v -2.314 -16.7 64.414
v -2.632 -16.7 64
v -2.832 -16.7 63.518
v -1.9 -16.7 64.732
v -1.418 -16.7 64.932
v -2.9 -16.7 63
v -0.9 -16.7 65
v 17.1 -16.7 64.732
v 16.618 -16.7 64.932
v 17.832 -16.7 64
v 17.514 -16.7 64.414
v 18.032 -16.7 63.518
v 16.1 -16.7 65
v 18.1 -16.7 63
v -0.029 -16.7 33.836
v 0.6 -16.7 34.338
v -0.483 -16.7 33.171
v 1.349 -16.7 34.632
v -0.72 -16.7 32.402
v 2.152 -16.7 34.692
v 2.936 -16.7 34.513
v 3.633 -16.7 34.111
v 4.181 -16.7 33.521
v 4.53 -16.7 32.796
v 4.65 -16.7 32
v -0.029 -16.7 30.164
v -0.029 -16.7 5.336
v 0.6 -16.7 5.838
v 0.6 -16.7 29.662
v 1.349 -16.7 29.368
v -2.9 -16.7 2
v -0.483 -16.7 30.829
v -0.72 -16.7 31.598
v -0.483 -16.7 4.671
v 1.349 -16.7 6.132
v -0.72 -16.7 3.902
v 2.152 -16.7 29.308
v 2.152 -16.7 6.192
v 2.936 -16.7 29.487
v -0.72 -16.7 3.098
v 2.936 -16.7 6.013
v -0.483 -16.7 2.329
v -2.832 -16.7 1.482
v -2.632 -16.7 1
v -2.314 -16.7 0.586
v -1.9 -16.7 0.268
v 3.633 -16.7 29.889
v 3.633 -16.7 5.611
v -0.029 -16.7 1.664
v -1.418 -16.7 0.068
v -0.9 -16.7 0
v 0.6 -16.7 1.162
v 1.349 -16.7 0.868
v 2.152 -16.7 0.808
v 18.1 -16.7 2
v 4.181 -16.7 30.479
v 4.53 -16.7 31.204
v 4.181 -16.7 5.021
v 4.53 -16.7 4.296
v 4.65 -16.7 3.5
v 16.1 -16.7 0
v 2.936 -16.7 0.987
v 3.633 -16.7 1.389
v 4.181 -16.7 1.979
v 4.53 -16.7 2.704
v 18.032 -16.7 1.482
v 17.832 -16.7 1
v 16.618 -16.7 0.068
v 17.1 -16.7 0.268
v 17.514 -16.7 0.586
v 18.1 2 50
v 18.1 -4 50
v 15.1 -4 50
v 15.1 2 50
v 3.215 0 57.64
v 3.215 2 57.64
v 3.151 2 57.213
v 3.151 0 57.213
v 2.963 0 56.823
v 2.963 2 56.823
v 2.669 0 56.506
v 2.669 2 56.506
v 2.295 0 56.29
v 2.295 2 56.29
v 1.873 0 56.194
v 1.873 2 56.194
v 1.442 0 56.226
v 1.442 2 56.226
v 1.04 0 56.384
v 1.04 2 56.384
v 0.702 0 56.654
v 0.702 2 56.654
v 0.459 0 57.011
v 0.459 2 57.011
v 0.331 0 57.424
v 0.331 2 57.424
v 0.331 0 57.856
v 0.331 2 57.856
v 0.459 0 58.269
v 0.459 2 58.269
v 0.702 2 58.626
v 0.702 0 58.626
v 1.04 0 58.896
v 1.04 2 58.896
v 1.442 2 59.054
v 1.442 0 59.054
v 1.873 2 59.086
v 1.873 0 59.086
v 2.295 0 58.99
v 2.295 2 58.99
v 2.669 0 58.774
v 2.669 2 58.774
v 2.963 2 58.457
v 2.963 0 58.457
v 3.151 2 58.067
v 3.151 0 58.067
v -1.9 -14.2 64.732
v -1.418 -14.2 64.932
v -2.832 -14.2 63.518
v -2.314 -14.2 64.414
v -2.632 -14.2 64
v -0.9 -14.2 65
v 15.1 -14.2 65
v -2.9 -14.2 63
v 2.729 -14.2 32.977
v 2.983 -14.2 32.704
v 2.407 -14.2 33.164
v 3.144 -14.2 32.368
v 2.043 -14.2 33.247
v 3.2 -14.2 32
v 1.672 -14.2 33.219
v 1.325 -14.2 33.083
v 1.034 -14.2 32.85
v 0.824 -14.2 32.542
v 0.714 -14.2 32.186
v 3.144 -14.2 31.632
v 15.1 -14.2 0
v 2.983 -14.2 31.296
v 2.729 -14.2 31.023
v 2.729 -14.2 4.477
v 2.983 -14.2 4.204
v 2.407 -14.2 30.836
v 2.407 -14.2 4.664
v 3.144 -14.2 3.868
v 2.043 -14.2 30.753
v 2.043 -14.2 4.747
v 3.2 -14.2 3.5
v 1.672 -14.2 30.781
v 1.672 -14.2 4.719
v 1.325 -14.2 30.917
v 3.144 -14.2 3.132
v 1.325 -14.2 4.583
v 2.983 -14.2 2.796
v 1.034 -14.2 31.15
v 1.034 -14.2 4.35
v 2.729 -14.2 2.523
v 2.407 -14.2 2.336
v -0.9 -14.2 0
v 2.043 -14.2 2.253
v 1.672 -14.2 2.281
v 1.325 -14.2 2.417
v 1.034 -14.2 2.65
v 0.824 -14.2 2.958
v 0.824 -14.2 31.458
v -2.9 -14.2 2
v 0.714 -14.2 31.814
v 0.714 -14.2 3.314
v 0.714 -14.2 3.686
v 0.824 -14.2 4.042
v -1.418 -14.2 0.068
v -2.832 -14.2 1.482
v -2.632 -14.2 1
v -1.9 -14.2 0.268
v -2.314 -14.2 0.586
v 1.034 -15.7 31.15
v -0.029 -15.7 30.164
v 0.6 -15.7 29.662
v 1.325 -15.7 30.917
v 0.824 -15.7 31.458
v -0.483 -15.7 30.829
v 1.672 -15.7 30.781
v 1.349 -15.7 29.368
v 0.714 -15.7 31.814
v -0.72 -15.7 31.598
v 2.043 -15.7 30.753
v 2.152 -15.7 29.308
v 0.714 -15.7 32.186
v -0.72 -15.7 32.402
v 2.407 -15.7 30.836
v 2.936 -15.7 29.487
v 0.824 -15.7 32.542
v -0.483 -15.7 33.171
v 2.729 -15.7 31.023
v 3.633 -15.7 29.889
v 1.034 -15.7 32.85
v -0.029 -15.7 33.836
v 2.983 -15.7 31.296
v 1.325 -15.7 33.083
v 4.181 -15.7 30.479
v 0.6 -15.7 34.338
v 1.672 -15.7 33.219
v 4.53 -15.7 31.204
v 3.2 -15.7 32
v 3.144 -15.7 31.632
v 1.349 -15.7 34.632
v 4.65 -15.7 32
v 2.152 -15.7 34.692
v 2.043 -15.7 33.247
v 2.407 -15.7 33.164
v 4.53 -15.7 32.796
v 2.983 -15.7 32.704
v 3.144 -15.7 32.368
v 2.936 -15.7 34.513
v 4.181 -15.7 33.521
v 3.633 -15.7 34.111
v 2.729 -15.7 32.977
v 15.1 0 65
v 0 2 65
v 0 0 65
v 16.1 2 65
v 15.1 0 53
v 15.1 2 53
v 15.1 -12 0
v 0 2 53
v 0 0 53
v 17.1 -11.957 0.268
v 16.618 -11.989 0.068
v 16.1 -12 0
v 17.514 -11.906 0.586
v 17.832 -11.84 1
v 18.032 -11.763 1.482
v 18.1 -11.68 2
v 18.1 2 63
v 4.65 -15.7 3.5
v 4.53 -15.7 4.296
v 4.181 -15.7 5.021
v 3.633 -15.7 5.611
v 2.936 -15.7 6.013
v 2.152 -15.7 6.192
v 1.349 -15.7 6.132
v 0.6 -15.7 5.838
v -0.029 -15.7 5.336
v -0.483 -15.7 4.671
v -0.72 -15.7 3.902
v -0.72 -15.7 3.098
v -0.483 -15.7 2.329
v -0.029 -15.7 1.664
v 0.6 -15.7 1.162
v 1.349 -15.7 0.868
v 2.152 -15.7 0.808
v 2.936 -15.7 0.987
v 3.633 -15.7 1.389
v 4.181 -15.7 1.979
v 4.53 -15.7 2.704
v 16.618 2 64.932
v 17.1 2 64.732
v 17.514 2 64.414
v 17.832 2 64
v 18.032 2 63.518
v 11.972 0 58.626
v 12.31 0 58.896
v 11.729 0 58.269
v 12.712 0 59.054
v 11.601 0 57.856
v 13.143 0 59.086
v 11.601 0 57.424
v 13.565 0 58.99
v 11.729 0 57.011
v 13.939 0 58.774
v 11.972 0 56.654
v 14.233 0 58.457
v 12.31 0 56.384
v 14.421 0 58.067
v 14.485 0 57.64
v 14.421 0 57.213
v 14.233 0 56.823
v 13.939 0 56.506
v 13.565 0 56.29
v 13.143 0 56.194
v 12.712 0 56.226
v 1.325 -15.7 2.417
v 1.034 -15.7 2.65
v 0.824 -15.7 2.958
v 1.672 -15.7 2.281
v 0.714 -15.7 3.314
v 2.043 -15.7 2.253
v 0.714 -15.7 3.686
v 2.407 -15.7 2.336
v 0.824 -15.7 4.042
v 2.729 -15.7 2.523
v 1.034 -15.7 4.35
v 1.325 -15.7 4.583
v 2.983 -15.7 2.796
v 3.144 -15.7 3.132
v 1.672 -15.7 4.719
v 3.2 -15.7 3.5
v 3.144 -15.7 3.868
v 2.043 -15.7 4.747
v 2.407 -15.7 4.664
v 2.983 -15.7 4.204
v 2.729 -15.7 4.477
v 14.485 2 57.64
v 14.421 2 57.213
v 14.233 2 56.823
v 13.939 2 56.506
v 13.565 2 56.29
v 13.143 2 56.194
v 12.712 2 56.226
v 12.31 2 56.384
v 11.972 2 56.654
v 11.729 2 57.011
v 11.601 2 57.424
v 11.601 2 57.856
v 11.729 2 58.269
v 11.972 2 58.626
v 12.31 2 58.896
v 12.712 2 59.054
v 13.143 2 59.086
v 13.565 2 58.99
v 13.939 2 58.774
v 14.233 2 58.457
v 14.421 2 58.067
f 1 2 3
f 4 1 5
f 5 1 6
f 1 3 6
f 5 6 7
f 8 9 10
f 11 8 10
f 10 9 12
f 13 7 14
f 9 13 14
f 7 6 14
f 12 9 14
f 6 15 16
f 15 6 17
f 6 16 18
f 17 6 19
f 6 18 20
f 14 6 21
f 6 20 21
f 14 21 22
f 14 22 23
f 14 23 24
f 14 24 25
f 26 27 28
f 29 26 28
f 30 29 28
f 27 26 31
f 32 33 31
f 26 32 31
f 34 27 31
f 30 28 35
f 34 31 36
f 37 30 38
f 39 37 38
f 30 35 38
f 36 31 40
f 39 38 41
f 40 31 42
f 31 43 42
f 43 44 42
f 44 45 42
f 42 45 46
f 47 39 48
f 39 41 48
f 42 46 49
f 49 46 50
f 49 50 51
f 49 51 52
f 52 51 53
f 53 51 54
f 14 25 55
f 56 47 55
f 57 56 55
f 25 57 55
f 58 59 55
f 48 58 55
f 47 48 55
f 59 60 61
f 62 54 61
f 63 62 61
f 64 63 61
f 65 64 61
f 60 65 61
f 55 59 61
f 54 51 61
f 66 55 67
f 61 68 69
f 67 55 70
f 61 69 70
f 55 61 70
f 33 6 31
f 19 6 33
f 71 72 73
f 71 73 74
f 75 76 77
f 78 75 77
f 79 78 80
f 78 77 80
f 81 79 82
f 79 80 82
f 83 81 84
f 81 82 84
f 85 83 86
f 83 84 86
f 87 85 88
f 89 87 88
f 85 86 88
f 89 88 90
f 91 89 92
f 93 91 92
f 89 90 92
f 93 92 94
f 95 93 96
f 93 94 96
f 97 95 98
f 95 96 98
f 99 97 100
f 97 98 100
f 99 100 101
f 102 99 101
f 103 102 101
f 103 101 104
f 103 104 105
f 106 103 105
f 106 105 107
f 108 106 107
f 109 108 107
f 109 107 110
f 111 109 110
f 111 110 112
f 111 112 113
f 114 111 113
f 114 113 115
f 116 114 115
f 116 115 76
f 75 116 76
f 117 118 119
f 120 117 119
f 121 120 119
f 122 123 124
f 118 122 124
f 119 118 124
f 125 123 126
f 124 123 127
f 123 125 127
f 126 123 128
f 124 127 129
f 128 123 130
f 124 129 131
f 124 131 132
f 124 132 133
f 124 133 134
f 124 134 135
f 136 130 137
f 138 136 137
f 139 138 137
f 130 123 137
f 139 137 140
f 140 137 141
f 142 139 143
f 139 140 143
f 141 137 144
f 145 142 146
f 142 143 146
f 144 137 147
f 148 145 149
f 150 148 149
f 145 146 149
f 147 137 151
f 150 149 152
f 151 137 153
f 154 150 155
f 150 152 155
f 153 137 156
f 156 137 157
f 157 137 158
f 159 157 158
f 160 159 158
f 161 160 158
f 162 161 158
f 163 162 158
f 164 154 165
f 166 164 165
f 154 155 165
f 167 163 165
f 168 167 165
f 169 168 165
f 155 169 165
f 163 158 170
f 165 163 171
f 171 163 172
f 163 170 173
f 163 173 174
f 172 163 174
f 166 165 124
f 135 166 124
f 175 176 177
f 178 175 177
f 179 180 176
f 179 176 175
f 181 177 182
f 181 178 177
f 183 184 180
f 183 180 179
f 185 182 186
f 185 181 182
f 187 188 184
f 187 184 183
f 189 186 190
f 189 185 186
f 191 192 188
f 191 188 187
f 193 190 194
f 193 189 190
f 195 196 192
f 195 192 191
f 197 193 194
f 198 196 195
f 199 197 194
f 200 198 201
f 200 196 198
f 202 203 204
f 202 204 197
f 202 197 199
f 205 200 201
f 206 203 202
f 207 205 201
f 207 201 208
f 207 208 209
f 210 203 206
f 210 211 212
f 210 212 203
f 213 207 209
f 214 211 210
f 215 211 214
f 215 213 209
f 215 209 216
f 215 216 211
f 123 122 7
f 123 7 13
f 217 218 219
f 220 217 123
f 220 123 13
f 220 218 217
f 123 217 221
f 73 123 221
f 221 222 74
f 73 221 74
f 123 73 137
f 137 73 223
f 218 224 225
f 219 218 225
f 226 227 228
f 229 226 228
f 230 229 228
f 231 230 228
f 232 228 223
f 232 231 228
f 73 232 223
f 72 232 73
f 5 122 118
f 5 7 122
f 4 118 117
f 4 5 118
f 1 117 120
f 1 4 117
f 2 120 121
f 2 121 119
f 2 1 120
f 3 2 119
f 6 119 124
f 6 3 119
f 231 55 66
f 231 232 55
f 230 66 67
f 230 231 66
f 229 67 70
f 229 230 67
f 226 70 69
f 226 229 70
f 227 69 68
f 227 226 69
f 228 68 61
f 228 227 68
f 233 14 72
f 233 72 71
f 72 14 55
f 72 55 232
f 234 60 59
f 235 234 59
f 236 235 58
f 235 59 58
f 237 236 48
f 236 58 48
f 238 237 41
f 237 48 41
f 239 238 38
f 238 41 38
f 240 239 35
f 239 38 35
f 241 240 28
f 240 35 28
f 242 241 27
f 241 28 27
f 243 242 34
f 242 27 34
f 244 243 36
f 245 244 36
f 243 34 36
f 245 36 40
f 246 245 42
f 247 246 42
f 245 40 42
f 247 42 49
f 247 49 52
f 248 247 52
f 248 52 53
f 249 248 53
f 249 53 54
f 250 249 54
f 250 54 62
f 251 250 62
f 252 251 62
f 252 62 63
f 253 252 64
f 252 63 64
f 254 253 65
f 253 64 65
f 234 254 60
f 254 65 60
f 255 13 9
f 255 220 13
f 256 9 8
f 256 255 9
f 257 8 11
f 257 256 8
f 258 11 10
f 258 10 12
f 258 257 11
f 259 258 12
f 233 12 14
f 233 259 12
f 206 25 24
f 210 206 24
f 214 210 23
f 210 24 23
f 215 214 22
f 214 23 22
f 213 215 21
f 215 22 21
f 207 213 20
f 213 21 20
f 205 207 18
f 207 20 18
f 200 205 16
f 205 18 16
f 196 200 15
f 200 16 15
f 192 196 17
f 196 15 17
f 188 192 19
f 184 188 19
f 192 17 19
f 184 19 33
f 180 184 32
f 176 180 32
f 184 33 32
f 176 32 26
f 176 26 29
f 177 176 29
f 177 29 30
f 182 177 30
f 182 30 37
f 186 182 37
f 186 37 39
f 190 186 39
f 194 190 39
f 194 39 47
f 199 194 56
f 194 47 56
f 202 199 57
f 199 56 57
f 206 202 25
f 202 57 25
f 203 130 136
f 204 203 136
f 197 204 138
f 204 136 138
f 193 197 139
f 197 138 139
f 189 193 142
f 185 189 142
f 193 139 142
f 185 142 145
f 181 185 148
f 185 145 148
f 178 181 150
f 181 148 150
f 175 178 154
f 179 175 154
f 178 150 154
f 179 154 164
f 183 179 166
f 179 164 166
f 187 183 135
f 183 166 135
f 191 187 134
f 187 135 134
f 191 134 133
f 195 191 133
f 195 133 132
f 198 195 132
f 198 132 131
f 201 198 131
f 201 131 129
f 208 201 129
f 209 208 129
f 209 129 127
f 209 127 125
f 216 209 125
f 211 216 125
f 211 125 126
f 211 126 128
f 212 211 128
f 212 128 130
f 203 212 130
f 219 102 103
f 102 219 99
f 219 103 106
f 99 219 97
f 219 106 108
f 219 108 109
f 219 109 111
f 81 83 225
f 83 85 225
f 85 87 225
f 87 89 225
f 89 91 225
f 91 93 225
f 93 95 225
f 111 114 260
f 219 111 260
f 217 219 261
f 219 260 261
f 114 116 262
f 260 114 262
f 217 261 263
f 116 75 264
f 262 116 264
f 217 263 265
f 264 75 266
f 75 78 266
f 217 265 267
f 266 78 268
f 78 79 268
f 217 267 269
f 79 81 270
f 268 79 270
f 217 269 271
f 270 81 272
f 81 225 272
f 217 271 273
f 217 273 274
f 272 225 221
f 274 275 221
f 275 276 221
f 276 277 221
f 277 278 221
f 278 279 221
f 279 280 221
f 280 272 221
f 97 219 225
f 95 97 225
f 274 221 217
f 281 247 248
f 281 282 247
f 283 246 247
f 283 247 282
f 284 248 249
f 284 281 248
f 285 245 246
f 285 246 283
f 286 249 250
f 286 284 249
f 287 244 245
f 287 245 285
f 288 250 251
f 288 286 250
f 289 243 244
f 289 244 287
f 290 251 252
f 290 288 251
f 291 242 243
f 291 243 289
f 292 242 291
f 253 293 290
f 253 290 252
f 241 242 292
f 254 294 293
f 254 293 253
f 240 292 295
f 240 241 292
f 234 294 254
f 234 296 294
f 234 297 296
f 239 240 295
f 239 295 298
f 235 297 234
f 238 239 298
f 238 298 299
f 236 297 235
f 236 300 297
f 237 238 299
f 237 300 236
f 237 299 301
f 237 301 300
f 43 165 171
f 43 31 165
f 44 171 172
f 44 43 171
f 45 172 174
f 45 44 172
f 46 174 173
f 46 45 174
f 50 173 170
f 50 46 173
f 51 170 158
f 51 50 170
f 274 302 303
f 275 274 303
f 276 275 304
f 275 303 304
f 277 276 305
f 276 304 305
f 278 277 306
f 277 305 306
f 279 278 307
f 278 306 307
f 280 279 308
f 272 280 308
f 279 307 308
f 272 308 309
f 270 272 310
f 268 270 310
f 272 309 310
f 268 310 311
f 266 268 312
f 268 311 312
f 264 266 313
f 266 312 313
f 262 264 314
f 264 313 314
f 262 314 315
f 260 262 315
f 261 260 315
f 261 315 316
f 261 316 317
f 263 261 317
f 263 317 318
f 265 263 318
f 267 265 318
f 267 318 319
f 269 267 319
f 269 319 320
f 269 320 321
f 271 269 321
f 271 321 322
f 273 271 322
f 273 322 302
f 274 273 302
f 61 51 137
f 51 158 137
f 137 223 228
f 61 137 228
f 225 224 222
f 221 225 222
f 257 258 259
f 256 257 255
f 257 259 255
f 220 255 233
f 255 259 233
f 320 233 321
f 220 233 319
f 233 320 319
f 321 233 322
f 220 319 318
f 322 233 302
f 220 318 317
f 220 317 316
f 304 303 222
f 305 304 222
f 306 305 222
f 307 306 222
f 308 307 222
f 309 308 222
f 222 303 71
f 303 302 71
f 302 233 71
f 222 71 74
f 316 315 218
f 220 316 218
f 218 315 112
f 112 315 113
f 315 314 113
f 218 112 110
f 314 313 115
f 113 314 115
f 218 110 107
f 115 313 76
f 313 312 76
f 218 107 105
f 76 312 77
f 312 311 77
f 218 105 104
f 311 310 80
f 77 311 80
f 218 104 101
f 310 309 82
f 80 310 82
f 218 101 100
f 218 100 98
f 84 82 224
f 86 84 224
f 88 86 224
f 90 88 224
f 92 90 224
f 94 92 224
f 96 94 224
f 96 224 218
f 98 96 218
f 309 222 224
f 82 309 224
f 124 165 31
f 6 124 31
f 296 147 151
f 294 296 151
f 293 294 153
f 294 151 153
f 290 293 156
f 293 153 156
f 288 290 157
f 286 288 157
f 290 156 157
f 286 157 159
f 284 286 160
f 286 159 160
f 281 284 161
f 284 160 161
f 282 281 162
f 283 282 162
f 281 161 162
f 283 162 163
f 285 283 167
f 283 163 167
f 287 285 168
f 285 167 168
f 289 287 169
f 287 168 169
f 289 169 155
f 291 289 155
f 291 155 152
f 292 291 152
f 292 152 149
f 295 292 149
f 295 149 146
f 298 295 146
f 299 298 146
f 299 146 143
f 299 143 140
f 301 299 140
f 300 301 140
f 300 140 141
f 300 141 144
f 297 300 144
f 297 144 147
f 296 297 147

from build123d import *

# Parameters (mm, degrees)
EXTRUDE_1_DEPTH     = 65
CUT_EXTRUDE_1_REACH = 20.7
SKETCH_2_R          = 1.45
SKETCH_2_W          = 15.1
SKETCH_2_H          = 53
CUT_EXTRUDE_2_REACH = 4.5
SKETCH_3_R          = 1.25
CUT_EXTRUDE_3_REACH = 23
FILLET_1_R          = 2
SKETCH_5_R          = 2.7
CUT_EXTRUDE_4_DEPTH = 1


with BuildPart() as part:
    # 草图1 → 凸台-拉伸1 (new body)
    with BuildSketch(Plane.XY):
        Polygon((0, 2), (0, 0), (15.1, 0), (15.1, -14.2), (-2.9, -14.2), (-2.9, -16.7), (18.1, -16.7), (18.1, 2), align=None)
    extrude(amount=EXTRUDE_1_DEPTH)

    # 草图2 → 切除-拉伸1 (cut, up to next)
    with BuildSketch(Plane(origin=(0, 2, 0), x_dir=(1, 0, 0), z_dir=(0, 1, 0)), mode=Mode.PRIVATE) as cut_extrude_1_sk1:
        with Locations((1.765, -57.64)):
            Circle(SKETCH_2_R)
    cut_extrude_1_tool1 = extrude(cut_extrude_1_sk1.sketch, amount=-CUT_EXTRUDE_1_REACH, mode=Mode.PRIVATE) & part.part
    add(cut_extrude_1_tool1.solids().sort_by_distance((1.765, 2, 57.64))[0], mode=Mode.SUBTRACT)
    # 草图2 → 切除-拉伸1 (cut, up to next)
    with BuildSketch(Plane(origin=(0, 2, 0), x_dir=(1, 0, 0), z_dir=(0, 1, 0)), mode=Mode.PRIVATE) as cut_extrude_1_sk2:
        with Locations((13.035, -57.64)):
            Circle(SKETCH_2_R)
    cut_extrude_1_tool2 = extrude(cut_extrude_1_sk2.sketch, amount=-CUT_EXTRUDE_1_REACH, mode=Mode.PRIVATE) & part.part
    add(cut_extrude_1_tool2.solids().sort_by_distance((13.035, 2, 57.64))[0], mode=Mode.SUBTRACT)
    # 草图2 → 切除-拉伸1 (cut, up to next)
    with BuildSketch(Plane(origin=(0, 2, 0), x_dir=(1, 0, 0), z_dir=(0, 1, 0)), mode=Mode.PRIVATE) as cut_extrude_1_sk3:
        with Locations((7.55, -26.5)):
            Rectangle(SKETCH_2_W, SKETCH_2_H)
    cut_extrude_1_tool3 = extrude(cut_extrude_1_sk3.sketch, amount=-CUT_EXTRUDE_1_REACH, mode=Mode.PRIVATE) & part.part
    add(cut_extrude_1_tool3.solids().sort_by_distance((7.55, 2, 26.5))[0], mode=Mode.SUBTRACT)

    # 草图3 → 切除-拉伸2 (cut, up to next)
    with BuildSketch(Plane(origin=(0, -14.2, 0), x_dir=(1, 0, 0), z_dir=(0, 1, 0)), mode=Mode.PRIVATE) as cut_extrude_2_sk1:
        with Locations((1.95, -3.5)):
            Circle(SKETCH_3_R)
    cut_extrude_2_tool1 = extrude(cut_extrude_2_sk1.sketch, amount=-CUT_EXTRUDE_2_REACH, mode=Mode.PRIVATE) & part.part
    add(cut_extrude_2_tool1.solids().sort_by_distance((1.95, -14.2, 3.5))[0], mode=Mode.SUBTRACT)
    # 草图3 → 切除-拉伸2 (cut, up to next)
    with BuildSketch(Plane(origin=(0, -14.2, 0), x_dir=(1, 0, 0), z_dir=(0, 1, 0)), mode=Mode.PRIVATE) as cut_extrude_2_sk2:
        with Locations((1.95, -32)):
            Circle(SKETCH_3_R)
    cut_extrude_2_tool2 = extrude(cut_extrude_2_sk2.sketch, amount=-CUT_EXTRUDE_2_REACH, mode=Mode.PRIVATE) & part.part
    add(cut_extrude_2_tool2.solids().sort_by_distance((1.95, -14.2, 32))[0], mode=Mode.SUBTRACT)

    # 草图4 → 切除-拉伸3 (cut, up to next)
    with BuildSketch(Plane(origin=(18.1, 0, 0), x_dir=(0, 0, -1), z_dir=(1, 0, 0)), mode=Mode.PRIVATE) as cut_extrude_3_sk1:
        Polygon((-50, 2), (0, 2), (0, -12), (-50, -4), align=None)
    cut_extrude_3_tool1 = extrude(cut_extrude_3_sk1.sketch, amount=-CUT_EXTRUDE_3_REACH, mode=Mode.PRIVATE) & part.part
    add(cut_extrude_3_tool1.solids().sort_by_distance((18.1, -3.266667, 21.666667))[0], mode=Mode.SUBTRACT)

    # 圆角1
    fillet_1_edges = [part.edges().sort_by_distance(p)[0] for p in [
        (-2.9, -15.45, 65),
        (18.1, -7.35, 65),
        (18.1, -14.35, 0),
        (-2.9, -15.45, 0),
    ]]
    fillet(fillet_1_edges, radius=FILLET_1_R)

    # 草图5 → 切除-拉伸4 (cut)
    with BuildSketch(Plane.XZ.offset(16.7)):
        with Locations((1.95, 32)):
            Circle(SKETCH_5_R)
        with Locations((1.95, 3.5)):
            Circle(SKETCH_5_R)
    extrude(amount=-CUT_EXTRUDE_4_DEPTH, mode=Mode.SUBTRACT)


solid = part.part
